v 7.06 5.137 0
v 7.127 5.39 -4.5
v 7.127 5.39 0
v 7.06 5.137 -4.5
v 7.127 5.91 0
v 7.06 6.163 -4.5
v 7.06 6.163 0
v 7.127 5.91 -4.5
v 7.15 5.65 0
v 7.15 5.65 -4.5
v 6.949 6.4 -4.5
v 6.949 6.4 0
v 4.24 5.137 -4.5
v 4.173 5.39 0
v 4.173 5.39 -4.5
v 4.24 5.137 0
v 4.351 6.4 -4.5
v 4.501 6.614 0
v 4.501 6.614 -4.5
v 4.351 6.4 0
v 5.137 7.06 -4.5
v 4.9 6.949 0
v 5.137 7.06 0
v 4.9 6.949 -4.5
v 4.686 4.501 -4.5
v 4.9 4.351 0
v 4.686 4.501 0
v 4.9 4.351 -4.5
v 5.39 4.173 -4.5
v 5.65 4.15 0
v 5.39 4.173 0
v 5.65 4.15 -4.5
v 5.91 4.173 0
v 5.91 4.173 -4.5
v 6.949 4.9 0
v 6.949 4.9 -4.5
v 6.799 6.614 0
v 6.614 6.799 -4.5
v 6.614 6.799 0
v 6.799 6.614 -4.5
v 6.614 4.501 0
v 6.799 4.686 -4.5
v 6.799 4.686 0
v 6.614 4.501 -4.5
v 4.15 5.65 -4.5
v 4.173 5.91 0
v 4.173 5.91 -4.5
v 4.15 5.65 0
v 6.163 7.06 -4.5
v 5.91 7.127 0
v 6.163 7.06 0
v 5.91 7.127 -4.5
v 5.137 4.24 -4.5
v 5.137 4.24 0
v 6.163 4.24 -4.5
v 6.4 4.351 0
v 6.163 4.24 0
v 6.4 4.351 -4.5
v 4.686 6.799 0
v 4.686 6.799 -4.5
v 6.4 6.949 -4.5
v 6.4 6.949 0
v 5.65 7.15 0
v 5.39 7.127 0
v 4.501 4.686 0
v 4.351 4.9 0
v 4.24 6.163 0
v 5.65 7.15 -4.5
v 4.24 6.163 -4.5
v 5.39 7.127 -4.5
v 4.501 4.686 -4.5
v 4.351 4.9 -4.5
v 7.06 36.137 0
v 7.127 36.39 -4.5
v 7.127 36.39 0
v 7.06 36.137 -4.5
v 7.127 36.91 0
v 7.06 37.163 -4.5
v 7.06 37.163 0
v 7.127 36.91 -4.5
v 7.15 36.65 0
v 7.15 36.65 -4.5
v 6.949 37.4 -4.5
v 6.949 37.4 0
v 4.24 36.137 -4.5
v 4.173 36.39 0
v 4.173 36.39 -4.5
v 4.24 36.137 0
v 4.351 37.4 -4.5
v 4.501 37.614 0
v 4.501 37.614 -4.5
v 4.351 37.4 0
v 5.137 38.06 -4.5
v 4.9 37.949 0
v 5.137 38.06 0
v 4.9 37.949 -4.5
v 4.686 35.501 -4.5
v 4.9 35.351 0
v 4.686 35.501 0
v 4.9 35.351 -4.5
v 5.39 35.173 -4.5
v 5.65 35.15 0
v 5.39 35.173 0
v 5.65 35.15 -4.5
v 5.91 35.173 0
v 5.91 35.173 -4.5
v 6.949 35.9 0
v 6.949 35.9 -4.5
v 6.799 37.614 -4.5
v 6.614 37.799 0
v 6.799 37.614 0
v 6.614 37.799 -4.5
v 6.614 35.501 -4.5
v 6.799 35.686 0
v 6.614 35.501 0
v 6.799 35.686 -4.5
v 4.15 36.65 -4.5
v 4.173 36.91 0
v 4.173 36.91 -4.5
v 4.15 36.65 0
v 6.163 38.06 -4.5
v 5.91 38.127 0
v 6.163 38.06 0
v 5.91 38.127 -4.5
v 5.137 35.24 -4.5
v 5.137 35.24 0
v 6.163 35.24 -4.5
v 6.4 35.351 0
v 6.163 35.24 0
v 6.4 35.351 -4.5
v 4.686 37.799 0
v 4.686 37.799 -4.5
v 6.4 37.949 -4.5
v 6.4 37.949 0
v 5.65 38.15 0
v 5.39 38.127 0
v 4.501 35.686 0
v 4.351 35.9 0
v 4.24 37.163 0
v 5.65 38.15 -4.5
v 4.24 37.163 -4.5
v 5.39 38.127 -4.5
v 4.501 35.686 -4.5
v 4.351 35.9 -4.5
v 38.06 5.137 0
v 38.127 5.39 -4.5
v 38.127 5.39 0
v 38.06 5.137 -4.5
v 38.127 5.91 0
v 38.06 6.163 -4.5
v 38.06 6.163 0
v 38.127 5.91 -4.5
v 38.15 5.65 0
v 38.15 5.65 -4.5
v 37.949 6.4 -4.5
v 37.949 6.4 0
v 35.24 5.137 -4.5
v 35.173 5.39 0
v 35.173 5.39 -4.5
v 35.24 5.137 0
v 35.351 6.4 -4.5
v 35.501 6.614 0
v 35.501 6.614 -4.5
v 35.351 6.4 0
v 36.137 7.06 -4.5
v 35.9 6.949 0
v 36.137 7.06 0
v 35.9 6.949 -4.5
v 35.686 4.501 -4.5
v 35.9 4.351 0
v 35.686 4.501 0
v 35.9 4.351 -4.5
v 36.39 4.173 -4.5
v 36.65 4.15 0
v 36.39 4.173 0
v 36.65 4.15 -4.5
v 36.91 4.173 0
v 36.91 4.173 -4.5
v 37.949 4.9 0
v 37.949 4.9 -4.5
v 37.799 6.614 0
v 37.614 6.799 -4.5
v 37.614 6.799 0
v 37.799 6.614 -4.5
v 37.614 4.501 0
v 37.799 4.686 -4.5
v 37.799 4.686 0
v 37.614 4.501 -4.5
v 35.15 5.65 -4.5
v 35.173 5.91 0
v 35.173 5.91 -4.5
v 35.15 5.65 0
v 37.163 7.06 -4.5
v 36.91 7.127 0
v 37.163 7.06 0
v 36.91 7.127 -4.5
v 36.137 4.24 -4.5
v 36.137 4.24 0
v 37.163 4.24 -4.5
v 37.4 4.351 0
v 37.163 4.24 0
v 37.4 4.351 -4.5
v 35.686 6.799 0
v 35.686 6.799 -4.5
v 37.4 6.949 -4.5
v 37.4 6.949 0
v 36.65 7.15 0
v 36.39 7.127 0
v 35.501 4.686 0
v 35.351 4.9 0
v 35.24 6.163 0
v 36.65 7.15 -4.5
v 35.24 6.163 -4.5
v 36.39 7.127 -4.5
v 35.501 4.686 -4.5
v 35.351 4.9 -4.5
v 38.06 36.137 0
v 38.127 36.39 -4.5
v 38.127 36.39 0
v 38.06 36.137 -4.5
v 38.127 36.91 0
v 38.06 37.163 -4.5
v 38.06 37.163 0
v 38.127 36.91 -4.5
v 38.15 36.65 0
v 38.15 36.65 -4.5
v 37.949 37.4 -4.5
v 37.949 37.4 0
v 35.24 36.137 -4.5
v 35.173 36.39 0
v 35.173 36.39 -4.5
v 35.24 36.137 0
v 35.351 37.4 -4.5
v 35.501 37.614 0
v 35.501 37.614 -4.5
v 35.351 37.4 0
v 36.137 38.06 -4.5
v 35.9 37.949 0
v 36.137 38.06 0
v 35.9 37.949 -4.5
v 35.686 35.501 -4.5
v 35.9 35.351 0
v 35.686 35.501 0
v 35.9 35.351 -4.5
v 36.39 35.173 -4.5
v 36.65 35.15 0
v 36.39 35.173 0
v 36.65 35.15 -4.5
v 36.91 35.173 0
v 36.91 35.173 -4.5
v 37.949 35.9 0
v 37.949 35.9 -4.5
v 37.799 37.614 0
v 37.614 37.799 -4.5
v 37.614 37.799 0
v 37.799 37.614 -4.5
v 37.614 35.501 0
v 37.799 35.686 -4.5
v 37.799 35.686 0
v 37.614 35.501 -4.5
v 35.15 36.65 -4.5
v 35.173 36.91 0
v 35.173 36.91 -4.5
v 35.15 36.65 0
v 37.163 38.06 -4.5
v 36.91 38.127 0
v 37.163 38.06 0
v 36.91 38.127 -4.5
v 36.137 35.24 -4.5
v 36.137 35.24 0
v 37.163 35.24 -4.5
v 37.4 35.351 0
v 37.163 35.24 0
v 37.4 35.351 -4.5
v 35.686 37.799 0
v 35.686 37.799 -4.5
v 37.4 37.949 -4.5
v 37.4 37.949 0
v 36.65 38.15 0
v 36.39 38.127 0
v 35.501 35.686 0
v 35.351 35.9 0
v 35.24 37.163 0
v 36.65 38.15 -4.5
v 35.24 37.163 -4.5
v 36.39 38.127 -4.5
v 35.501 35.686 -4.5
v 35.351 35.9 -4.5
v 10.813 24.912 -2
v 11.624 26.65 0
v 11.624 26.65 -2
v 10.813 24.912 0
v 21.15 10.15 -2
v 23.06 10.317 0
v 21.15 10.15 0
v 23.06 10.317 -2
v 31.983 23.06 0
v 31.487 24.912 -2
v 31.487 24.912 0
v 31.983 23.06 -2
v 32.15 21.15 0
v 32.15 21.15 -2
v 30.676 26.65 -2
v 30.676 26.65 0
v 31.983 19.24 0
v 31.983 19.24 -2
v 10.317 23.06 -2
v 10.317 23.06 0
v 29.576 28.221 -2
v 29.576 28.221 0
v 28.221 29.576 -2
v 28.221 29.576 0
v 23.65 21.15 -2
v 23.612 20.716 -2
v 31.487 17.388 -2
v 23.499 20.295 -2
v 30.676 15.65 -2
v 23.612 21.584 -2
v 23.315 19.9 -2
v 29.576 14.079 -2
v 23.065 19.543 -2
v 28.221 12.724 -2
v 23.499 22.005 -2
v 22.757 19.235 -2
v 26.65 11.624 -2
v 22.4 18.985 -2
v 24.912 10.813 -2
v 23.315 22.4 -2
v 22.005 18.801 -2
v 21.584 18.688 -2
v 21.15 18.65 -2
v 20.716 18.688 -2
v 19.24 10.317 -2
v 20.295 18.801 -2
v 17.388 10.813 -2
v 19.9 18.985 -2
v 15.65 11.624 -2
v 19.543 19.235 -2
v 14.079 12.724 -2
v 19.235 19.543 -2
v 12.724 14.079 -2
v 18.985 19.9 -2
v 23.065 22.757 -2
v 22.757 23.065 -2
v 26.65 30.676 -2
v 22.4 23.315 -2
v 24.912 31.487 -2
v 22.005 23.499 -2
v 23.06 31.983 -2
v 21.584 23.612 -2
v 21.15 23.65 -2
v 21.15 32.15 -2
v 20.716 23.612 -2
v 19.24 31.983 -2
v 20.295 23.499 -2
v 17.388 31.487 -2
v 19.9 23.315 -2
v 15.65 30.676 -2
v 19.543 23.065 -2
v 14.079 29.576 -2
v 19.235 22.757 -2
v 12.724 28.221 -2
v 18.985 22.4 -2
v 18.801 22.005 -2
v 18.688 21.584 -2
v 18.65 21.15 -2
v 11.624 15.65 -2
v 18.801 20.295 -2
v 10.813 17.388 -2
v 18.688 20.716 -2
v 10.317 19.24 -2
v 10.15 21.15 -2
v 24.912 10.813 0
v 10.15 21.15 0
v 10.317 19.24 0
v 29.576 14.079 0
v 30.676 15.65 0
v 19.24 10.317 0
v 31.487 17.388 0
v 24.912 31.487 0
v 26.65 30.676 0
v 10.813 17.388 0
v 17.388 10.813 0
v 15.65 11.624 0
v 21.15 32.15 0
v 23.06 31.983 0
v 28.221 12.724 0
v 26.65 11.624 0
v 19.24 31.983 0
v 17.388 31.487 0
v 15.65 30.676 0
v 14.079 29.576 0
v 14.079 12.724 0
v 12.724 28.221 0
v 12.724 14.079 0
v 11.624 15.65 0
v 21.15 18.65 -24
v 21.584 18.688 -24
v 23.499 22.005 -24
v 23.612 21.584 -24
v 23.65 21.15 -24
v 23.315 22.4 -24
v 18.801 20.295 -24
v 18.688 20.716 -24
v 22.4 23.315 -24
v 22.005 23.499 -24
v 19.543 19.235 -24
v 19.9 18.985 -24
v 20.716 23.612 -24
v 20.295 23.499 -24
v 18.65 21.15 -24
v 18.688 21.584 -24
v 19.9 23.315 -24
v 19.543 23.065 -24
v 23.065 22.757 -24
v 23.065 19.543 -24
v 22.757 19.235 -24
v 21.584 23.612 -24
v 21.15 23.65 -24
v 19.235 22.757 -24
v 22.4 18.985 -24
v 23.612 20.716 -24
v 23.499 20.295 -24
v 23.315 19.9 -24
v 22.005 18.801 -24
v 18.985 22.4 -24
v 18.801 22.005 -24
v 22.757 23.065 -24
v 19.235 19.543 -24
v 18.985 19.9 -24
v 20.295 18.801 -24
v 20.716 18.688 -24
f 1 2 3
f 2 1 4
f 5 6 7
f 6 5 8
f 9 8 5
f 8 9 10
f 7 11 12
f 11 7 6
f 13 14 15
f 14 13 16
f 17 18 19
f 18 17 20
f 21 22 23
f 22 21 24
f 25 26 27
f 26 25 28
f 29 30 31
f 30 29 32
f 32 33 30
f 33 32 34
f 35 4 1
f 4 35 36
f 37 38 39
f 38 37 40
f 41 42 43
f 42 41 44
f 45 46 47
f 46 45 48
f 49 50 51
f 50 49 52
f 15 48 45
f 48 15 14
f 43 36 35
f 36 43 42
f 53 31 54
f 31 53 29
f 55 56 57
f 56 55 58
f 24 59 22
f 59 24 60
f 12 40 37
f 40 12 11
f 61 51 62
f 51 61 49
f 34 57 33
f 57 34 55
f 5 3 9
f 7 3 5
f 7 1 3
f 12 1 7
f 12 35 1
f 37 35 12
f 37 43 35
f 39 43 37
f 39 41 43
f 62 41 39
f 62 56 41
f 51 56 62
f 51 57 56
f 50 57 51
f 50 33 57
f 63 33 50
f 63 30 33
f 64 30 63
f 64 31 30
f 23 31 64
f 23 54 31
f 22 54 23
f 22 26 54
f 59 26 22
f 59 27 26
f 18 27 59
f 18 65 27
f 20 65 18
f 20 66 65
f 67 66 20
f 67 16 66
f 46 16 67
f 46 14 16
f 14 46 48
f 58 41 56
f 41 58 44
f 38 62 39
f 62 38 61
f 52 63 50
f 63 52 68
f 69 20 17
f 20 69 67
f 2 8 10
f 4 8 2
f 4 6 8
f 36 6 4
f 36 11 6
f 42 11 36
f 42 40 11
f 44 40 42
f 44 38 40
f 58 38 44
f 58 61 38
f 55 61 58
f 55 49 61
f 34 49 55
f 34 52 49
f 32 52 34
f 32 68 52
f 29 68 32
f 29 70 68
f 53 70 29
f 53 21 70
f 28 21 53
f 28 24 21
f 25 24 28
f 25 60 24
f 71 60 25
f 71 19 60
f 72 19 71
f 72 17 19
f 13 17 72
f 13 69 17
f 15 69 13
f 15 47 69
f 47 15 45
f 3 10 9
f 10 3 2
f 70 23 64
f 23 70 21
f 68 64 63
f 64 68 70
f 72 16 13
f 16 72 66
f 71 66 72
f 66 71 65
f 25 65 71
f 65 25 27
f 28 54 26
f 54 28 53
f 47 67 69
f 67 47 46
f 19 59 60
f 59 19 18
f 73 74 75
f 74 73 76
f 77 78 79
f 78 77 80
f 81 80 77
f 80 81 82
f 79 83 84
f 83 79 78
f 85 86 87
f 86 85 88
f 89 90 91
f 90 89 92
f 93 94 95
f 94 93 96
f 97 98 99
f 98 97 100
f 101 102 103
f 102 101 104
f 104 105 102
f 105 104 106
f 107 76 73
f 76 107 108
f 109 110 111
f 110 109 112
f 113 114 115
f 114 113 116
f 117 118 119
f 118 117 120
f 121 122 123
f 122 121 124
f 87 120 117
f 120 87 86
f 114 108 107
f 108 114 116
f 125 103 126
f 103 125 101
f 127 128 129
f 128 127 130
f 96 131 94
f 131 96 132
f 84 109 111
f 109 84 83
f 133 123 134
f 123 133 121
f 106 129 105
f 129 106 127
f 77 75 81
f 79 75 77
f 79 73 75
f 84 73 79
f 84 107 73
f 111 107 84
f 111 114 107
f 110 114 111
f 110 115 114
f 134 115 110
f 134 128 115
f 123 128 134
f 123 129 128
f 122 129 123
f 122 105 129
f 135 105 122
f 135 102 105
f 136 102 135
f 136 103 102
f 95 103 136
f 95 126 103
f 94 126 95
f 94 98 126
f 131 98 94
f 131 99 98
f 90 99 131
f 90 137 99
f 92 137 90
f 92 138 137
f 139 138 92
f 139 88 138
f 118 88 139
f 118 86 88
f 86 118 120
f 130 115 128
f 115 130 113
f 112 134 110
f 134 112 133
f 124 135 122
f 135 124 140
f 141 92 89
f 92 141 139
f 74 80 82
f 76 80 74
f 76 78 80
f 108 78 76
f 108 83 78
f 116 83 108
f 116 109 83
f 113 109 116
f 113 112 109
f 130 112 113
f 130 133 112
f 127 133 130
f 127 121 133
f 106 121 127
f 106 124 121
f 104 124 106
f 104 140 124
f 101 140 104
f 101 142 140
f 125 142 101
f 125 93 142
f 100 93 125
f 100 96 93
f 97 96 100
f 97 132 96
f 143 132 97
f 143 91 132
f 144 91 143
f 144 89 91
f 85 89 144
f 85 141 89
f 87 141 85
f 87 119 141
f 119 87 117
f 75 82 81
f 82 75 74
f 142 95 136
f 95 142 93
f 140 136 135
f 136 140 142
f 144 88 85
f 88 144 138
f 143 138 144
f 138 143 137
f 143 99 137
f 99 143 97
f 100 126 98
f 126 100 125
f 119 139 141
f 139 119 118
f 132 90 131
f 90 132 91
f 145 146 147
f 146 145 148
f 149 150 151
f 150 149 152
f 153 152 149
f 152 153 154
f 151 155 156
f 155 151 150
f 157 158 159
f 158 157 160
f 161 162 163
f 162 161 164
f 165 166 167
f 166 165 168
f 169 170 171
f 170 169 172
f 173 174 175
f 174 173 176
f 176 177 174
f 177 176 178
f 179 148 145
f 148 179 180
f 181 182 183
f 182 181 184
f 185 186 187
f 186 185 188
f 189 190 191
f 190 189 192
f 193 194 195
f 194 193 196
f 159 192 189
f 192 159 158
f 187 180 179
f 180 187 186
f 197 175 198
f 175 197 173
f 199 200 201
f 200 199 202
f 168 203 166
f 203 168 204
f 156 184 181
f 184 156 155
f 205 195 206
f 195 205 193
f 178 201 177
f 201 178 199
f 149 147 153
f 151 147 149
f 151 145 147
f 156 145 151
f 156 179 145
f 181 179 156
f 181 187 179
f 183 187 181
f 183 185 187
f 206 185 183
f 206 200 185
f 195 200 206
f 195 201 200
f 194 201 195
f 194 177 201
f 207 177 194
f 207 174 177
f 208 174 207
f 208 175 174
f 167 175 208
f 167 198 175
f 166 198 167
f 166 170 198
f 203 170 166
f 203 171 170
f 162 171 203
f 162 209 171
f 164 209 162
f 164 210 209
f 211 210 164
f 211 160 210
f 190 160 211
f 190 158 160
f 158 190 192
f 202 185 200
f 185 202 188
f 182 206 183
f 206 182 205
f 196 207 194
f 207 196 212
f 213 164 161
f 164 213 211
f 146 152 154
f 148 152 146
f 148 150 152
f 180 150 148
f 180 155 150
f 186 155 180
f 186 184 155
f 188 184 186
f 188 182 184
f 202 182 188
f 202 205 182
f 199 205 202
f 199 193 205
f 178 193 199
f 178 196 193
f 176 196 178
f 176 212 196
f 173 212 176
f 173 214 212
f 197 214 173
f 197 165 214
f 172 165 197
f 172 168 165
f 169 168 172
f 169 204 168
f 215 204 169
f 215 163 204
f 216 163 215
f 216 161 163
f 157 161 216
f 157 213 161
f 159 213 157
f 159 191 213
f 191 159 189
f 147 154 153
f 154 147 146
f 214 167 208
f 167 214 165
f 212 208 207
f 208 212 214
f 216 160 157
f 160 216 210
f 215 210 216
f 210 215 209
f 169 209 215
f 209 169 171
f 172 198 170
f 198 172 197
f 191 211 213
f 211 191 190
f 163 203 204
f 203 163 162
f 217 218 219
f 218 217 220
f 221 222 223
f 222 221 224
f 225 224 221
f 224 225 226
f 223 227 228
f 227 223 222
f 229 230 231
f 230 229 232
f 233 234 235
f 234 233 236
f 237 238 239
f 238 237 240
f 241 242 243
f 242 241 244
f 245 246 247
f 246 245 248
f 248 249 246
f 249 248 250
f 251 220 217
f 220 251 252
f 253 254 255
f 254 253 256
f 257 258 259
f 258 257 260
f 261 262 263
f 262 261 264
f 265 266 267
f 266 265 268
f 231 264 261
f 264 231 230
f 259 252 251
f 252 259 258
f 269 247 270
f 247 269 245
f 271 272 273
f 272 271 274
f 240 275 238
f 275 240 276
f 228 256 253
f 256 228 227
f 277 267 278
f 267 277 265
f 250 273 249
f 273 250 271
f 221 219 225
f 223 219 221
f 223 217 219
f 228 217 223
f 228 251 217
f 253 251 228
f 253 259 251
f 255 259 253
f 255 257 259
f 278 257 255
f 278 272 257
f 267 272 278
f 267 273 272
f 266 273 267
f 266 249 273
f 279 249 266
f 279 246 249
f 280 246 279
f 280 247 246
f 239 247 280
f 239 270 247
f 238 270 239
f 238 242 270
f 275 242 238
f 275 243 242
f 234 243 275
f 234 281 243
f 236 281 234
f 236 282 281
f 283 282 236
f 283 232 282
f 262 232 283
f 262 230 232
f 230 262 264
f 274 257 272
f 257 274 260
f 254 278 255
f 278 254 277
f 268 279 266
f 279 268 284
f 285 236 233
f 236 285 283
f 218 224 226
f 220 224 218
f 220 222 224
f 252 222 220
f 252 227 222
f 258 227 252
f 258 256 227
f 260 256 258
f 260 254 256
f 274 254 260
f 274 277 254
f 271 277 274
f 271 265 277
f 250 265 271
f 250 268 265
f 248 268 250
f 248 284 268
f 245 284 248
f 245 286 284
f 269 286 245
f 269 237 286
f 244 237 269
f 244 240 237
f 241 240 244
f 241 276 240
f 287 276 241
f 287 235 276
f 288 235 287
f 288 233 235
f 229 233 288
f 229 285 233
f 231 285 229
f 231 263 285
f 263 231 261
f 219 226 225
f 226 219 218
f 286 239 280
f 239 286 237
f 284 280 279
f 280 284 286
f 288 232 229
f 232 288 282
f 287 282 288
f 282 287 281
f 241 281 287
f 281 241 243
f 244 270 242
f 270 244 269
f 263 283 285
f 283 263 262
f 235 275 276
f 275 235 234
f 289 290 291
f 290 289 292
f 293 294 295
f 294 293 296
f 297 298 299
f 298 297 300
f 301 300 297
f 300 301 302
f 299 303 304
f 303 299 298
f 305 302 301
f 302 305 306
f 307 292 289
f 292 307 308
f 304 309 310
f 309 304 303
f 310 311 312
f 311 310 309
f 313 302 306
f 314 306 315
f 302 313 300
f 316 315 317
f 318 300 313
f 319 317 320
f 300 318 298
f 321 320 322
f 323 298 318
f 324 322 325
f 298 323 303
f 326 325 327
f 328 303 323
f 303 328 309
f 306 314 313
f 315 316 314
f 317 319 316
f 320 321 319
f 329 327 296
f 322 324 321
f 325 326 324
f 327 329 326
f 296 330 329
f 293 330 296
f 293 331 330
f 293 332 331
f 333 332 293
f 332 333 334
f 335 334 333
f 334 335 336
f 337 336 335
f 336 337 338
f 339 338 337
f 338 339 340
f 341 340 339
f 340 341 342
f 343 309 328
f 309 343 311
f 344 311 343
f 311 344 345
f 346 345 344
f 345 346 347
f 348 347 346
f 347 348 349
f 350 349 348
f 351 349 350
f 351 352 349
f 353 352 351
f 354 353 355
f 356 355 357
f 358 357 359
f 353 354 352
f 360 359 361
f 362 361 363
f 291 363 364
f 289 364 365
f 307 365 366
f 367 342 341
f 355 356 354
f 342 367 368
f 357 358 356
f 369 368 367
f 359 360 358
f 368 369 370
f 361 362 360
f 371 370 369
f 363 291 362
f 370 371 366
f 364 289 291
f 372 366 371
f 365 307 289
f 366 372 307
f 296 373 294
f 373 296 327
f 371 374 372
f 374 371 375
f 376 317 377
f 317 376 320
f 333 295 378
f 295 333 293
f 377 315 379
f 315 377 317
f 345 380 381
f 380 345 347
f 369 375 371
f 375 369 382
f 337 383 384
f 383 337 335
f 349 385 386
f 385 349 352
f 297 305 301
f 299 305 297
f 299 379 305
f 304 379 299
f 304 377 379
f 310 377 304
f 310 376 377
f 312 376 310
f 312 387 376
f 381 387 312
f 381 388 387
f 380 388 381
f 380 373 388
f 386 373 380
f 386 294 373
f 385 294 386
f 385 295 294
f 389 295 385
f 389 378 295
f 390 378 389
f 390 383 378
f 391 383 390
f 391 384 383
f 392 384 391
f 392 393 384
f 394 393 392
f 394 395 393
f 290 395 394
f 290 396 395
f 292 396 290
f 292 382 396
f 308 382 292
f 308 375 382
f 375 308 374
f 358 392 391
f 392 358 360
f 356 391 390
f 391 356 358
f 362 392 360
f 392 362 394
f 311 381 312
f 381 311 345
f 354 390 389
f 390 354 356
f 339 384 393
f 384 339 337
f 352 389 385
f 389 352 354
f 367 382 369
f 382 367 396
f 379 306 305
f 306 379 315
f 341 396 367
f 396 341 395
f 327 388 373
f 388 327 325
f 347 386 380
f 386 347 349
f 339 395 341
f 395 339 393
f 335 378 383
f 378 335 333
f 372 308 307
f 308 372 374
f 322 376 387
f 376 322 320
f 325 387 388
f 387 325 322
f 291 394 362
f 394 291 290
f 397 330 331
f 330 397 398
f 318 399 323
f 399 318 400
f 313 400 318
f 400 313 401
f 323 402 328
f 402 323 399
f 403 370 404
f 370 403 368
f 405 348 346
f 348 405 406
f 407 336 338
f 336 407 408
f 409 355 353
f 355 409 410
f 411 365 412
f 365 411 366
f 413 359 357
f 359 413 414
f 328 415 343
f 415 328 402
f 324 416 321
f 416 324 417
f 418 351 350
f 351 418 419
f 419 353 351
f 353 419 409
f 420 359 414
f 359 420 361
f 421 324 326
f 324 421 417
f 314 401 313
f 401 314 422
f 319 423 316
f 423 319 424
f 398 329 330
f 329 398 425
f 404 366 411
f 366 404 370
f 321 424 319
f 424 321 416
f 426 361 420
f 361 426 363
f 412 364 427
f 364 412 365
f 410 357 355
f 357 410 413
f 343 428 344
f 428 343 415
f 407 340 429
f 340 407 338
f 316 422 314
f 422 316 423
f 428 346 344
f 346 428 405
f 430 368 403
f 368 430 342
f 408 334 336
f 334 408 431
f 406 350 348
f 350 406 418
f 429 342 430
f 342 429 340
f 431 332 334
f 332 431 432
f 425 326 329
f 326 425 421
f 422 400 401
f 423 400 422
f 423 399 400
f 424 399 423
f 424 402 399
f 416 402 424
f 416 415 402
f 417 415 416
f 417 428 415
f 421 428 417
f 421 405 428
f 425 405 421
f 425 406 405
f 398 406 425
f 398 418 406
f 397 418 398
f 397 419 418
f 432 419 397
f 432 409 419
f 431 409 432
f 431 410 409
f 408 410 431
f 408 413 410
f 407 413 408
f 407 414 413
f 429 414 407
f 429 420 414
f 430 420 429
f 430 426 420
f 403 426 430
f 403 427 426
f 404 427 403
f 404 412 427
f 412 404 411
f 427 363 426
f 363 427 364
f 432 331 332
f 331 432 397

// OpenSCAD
// file: posts.scad
/* Developed by Alex Grutter */

$fn = 36;

four_posts_with_supports(10, 3, 2, 25, 50, 5, 1, [0,0,0,0], 1, true);

module four_posts(post_height, post_outer_diameter, post_inner_diameter, post_spacing_width, post_spacing_length){
    difference()
    {
		/* Outer part */
		union()
		{
            translate([0, 0, 0])
            {
                cylinder(h = post_height, d = post_outer_diameter);
            }
            translate([0, post_spacing_length + 0, 0])
            {
                cylinder(h = post_height, d = post_outer_diameter);
            }
            translate([post_spacing_width + 0, 0, 0])
            {
                cylinder(h = post_height, d = post_outer_diameter);
            }
            translate([post_spacing_width + 0, post_spacing_length + 0, 0])
            {
                cylinder(h = post_height, d = post_outer_diameter);
            }
		}
		/* Inner hole */
        union()
        {
            translate([0, 0, -1])
            {
                cylinder(h = post_height+2, d = post_inner_diameter);
            }
            translate([0, post_spacing_length + 0, -1])
            {
                cylinder(h = post_height+2, d = post_inner_diameter);
            }
            translate([post_spacing_width + 0, 0, -1])
            {
                cylinder(h = post_height+2, d = post_inner_diameter);
            }
            translate([post_spacing_width + 0, post_spacing_length + 0, -1])
            {
                cylinder(h = post_height+2, d = post_inner_diameter);
            }
        }
	}
};

module four_posts_with_supports(post_height, post_outer_diameter, post_inner_diameter, post_spacing_width, post_spacing_length, support_diameter, support_count, support_start_angle, support_thickness, flip){
    difference()
    {
		/* Outer part */
		union()
		{
            translate([0, 0, 0])
            {
                cylinder(h = post_height, d = post_outer_diameter);
				for(support = [0 : support_count])
				{
					if(flip)
					{
						translate([0, 0, post_height])
						rotate([support_start_angle[0] + ( support * (360 / support_count)),90,0])
						translate([0, 0, -(support_thickness / 2)])
						linear_extrude(support_thickness)
						polygon([[post_height, (post_inner_diameter / 2)],[0, (post_inner_diameter / 2)],[0,(support_diameter / 2)]], [[0,1,2]]);
					}
					else
					{
						rotate([support_start_angle[0] + ( support * (360 / support_count)),-90,0])
						translate([0, 0, -(support_thickness / 2)])
						linear_extrude(support_thickness)
						polygon([[post_height, (post_inner_diameter / 2)],[0, (post_inner_diameter / 2)],[0, (support_diameter / 2)]], [[0,1,2]]);
					}
				}
            }
            translate([0, post_spacing_length + 0, 0])
            {
                cylinder(h = post_height, d = post_outer_diameter);
				for(support = [0 : support_count])
				{
					if(flip)
					{
						translate([0, 0, post_height])
						rotate([support_start_angle[1] + ( support * (360 / support_count)),90,0])
						translate([0, 0, -(support_thickness / 2)])
						linear_extrude(support_thickness)
						polygon([[post_height, (post_inner_diameter / 2)],[0, (post_inner_diameter / 2)],[0,(support_diameter / 2)]], [[0,1,2]]);
					}
					else
					{
						rotate([support_start_angle[1] + ( support * (360 / support_count)),-90,0])
						translate([0, 0, -(support_thickness / 2)])
						linear_extrude(support_thickness)
						polygon([[post_height, (post_inner_diameter / 2)],[0, (post_inner_diameter / 2)],[0,(support_diameter / 2)]], [[0,1,2]]);
					}
				}
            }
            translate([post_spacing_width + 0, 0, 0])
            {
                cylinder(h = post_height, d = post_outer_diameter);
				for(support = [0 : support_count])
				{
					if(flip)
					{
						translate([0, 0, post_height])
						rotate([support_start_angle[2] + ( support * (360 / support_count)),90,0])
						translate([0, 0, -(support_thickness / 2)])
						linear_extrude(support_thickness)
						polygon([[post_height, (post_inner_diameter / 2)],[0, (post_inner_diameter / 2)],[0,(support_diameter / 2)]], [[0,1,2]]);
					}
					else
					{
						rotate([support_start_angle[2] + ( support * (360 / support_count)),-90,0])
						translate([0, 0, -(support_thickness / 2)])
						linear_extrude(support_thickness)
						polygon([[post_height, (post_inner_diameter / 2)],[0, (post_inner_diameter / 2)],[0,(support_diameter / 2)]], [[0,1,2]]);
					}
				}
            }
            translate([post_spacing_width + 0, post_spacing_length + 0, 0])
            {
                cylinder(h = post_height, d = post_outer_diameter);
				for(support = [0 : support_count])
				{
					if(flip)
					{
						translate([0, 0, post_height])
						rotate([support_start_angle[3] + ( support * (360 / support_count)),90,0])
						translate([0, 0, -(support_thickness / 2)])
						linear_extrude(support_thickness)
						polygon([[post_height, (post_inner_diameter / 2)],[0, (post_inner_diameter / 2)],[0,(support_diameter / 2)]], [[0,1,2]]);
					}
					else
					{
						rotate([support_start_angle[3] + ( support * (360 / support_count)),-90,0])
						translate([0, 0, -(support_thickness / 2)])
						linear_extrude(support_thickness)
						polygon([[post_height, (post_inner_diameter / 2)],[0, (post_inner_diameter / 2)],[0,(support_diameter / 2)]], [[0,1,2]]);
					}
				}
            }
		}
        
		/* Inner hole */
        union()
        {
            translate([0, 0, -1])
            {
                cylinder(h = post_height+2, d = post_inner_diameter);
            }
            translate([0, post_spacing_length + 0, -1])
            {
                cylinder(h = post_height+2, d = post_inner_diameter);
            }
            translate([post_spacing_width + 0, 0, -1])
            {
                cylinder(h = post_height+2, d = post_inner_diameter);
            }
            translate([post_spacing_width + 0, post_spacing_length + 0, -1])
            {
                cylinder(h = post_height+2, d = post_inner_diameter);
            }
        }
	}
};
// main file
use <posts.scad>

/* Examples for viewing */
nema_17_holes();

module nema_17_holes()
{
    /* Hole parameters */
    mount_hole_depth            = 4.5;
    hole_inner_diameter         = 3;
    
    /* Based on drawings */
    total_width                 = 42.3;
    mount_hole_spacing          = 31.0;
    
    /* Calculated offset from edge to start of hole */
    mount_edge_offset           = (total_width - mount_hole_spacing) / 2;
    
    /* Shaft baseplate circular offset clearance */
    shaft_baseplate_diameter    = 22.0;
    shaft_baseplate_depth       = 2;
    shaft_diameter              = 5;
    shaft_length                = 24;
    
    /* Length positioning parameters */
    hole1_offset_length         = mount_edge_offset;
    hole2_offset_length         = hole1_offset_length;
    hole3_offset_length         = mount_edge_offset + mount_hole_spacing;
    hole4_offset_length         = hole3_offset_length;
    hole5_offset_length         = total_width / 2;
    
    /* Width positioning parameters */
    hole1_offset_width          = mount_edge_offset + mount_hole_spacing;
    hole2_offset_width          = mount_edge_offset;
    hole3_offset_width          = hole1_offset_width;
    hole4_offset_width          = hole2_offset_width;
    hole5_offset_width          = total_width / 2;
    
    /* Hole 1: */
    translate([hole1_offset_length, total_width - hole1_offset_width, -mount_hole_depth])
    four_posts(mount_hole_depth, hole_inner_diameter, 0, 0, 0);
    
    /* Hole 2: */
    translate([hole2_offset_length, total_width - hole2_offset_width, -mount_hole_depth])
    four_posts(mount_hole_depth, hole_inner_diameter, 0, 0, 0);
        
    /* Hole 3: */
    translate([hole3_offset_length, total_width - hole3_offset_width, -mount_hole_depth])
    four_posts(mount_hole_depth, hole_inner_diameter, 0, 0, 0);
    
    /* Hole 4: */
    translate([hole4_offset_length, total_width - hole4_offset_width, -mount_hole_depth])
    four_posts(mount_hole_depth, hole_inner_diameter, 0, 0, 0);

    /* Hole 5: */
    translate([hole5_offset_length, total_width - hole5_offset_width, -shaft_baseplate_depth])
    four_posts(shaft_baseplate_depth, shaft_baseplate_diameter, 0, 0, 0);

    /* Hole 6: */
    translate([hole5_offset_length, total_width - hole5_offset_width, -shaft_length])
    four_posts(shaft_length, shaft_diameter, 0, 0, 0);
}
